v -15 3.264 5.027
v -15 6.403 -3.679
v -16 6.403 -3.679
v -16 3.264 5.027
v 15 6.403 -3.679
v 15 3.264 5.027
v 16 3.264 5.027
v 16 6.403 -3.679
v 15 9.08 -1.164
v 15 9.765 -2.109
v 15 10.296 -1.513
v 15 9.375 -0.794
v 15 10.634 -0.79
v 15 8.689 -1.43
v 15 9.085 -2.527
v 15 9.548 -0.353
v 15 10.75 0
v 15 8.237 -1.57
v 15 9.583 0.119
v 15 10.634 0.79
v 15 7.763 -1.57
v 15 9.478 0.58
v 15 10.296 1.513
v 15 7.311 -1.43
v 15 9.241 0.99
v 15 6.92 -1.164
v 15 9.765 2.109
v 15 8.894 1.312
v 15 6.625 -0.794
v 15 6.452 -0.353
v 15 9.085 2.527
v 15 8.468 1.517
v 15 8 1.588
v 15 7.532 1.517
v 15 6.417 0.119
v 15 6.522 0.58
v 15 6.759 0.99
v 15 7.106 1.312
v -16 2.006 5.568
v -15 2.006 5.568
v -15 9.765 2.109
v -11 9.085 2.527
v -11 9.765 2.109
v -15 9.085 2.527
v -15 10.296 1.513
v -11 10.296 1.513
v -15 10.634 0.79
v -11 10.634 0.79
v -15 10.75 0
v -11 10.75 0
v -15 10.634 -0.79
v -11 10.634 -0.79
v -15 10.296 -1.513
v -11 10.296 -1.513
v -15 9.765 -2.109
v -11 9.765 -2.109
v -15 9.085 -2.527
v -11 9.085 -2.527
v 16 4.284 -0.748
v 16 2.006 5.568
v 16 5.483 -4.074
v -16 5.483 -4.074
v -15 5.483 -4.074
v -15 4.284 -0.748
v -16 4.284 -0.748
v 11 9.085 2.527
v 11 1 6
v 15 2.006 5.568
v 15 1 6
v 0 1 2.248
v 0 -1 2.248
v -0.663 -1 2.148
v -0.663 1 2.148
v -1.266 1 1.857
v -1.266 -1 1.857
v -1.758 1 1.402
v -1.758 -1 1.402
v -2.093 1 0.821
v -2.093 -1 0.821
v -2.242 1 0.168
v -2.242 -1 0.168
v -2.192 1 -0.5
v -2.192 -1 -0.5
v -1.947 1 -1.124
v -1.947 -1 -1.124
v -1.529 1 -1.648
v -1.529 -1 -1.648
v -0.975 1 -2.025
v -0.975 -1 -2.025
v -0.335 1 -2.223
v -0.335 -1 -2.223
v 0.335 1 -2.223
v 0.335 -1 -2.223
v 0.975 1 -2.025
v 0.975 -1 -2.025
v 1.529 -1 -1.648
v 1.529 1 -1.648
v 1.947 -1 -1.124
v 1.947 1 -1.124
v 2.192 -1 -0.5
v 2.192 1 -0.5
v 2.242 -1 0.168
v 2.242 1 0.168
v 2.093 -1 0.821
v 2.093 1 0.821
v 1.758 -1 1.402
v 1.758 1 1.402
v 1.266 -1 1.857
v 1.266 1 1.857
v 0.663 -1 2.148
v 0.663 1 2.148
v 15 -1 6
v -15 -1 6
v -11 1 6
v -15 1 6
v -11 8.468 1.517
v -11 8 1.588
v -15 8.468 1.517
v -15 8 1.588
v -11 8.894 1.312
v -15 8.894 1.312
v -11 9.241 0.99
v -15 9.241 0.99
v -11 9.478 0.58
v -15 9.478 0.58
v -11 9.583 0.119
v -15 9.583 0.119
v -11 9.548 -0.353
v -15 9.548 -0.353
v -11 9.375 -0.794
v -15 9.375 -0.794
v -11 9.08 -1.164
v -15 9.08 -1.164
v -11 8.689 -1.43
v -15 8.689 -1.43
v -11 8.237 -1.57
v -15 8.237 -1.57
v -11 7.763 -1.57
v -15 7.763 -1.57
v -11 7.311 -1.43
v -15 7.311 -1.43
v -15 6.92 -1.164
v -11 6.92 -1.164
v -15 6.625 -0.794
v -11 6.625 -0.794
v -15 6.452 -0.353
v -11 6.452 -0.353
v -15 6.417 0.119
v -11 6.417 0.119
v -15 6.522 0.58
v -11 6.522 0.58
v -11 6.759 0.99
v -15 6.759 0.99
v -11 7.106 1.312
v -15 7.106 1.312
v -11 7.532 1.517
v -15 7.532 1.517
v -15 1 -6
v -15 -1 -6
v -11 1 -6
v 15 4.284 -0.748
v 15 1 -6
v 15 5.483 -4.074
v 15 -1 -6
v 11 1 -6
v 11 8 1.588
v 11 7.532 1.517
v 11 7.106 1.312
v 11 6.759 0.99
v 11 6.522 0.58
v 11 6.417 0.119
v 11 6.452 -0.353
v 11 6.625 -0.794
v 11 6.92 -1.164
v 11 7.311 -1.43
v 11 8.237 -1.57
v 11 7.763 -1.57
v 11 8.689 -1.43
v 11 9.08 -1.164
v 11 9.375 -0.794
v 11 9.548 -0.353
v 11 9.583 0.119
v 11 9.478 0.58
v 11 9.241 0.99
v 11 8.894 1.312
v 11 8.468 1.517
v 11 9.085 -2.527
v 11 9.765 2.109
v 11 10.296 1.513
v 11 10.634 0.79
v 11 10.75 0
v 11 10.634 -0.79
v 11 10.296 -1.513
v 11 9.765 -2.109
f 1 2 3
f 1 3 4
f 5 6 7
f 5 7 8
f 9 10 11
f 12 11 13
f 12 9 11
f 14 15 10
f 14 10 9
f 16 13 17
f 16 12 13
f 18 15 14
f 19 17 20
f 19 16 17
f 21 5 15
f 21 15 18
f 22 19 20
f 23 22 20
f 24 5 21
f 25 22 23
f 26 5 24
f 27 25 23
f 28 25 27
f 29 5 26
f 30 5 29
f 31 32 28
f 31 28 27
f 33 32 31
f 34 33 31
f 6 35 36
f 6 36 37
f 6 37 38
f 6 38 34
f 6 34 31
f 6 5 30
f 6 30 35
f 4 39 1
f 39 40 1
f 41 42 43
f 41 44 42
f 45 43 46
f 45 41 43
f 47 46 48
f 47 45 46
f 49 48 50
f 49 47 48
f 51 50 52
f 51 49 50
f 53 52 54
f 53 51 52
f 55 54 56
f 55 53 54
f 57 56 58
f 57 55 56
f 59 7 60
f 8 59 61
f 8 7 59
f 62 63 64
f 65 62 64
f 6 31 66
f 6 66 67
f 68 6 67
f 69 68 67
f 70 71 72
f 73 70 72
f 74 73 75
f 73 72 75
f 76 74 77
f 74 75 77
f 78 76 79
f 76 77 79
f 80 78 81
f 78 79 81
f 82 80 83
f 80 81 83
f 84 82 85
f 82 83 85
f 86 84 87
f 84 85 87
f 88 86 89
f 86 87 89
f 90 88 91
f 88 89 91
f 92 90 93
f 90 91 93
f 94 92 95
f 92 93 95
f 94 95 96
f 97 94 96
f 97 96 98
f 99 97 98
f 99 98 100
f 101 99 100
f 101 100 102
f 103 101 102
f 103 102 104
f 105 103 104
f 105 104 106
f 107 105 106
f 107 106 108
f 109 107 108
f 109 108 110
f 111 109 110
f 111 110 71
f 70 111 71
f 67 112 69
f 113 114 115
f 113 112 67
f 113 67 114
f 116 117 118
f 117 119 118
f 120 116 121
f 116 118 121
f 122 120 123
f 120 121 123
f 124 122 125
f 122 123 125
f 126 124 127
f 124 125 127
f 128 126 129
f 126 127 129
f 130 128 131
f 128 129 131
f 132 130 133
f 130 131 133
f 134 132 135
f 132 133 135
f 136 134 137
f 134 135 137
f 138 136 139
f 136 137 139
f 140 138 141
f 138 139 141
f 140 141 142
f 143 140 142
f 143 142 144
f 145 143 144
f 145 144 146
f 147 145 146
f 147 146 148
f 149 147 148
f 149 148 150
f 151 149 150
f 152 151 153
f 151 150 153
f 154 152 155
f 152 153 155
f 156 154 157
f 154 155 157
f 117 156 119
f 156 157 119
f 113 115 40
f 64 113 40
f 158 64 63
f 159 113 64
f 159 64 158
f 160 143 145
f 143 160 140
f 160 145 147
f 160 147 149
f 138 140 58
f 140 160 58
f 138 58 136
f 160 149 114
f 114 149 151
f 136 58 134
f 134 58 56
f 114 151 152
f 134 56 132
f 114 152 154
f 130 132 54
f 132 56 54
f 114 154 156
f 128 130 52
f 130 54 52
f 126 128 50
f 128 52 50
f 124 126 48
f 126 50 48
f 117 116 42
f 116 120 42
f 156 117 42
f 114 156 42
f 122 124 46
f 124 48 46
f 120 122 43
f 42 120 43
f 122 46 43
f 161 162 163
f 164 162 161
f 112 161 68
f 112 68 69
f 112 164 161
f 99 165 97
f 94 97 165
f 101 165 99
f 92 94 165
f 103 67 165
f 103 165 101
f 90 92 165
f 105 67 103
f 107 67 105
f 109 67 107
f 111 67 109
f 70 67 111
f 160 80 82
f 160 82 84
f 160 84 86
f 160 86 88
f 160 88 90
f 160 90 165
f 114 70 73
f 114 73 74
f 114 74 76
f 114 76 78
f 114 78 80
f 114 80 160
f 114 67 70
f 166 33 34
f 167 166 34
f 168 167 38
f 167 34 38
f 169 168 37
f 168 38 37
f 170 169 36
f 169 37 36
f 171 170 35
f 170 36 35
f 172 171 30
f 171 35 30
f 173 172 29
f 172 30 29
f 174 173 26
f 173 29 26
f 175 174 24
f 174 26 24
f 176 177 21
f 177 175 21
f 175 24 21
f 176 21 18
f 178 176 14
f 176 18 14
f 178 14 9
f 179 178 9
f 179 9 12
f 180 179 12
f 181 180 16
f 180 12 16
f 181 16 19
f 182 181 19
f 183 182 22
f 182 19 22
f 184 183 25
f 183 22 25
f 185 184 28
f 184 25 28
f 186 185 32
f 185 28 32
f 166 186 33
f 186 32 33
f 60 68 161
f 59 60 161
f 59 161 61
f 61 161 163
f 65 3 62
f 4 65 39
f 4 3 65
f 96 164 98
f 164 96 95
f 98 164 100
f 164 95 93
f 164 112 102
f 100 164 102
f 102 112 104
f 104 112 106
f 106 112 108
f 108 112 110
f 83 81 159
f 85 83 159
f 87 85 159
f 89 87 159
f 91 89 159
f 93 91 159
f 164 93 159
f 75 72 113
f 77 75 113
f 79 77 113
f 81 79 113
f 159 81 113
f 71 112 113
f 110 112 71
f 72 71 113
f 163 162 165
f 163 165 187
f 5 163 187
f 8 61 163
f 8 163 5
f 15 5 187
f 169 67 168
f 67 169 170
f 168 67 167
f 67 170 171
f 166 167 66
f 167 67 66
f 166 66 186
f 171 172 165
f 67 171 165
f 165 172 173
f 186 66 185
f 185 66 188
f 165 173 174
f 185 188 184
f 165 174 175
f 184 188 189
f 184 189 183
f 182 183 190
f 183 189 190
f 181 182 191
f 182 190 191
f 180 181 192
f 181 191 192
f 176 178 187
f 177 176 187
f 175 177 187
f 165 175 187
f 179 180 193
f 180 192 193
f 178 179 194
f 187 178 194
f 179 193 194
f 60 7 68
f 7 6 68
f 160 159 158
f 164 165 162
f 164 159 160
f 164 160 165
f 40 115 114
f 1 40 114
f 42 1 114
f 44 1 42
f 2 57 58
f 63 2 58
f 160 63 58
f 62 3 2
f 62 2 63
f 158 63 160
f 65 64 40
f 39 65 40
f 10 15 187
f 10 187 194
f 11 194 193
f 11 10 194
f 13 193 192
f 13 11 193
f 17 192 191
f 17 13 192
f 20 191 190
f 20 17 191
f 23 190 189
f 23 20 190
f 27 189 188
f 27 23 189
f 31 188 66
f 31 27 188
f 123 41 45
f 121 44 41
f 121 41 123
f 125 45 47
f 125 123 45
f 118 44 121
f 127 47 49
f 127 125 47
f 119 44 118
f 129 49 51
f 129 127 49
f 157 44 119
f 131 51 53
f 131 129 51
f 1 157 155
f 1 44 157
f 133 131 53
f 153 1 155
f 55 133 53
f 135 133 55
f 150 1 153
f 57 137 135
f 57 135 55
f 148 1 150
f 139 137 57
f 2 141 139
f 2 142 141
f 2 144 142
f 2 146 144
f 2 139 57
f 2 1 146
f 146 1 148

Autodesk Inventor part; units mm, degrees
ref_plane "YZ Plane" through (0, 0, 0) normal (1, 0, 0) x (0, 1, 0)
ref_plane "XZ Plane" through (0, 0, 0) normal (0, 1, 0) x (-1, 0, 0)
ref_plane "XY Plane" through (0, 0, 0) normal (0, 0, 1) x (1, 0, 0)
sketch "Sketch1" plane through (0, 0, 0) normal (0, 1, 0) x (-1, 0, 0)
  line L0 (-15, 6) -> (15, 6)
  line L1 (15, 6) -> (15, -6)
  line L2 (15, -6) -> (-15, -6)
  line L3 (-15, -6) -> (-15, 6)
  line L4 (-15, 6) -> (15, -6) construction
  line L5 (15, 6) -> (-15, -6) construction
  point P0 (0, 0)
  dimension "d0" = 12
  dimension "d1" = 30
extrude "Extrusion1" add sketch "Sketch1" along normal mid plane 2
sketch "Sketch2" plane through (-15, -1, 6) normal (-1, 0, 0) x (0, 0, 1)
  circle A0 centre (-6, 9) radius 1.5875
  circle A1 centre (-6, 9) radius 2.75
  line L0 (-8.5267, 10.0854) -> (-12, 2)
  line L1 (0, 0) -> (0, 2) projected
  line L2 (-12, 2) -> (0, 2)
  line L3 (0, 2) -> (-3.4733, 10.0854)
  point P0 (-6, 1)
  dimension "d4" = 3.175
  dimension "d5" = 5.5
  dimension "d6" = 7
extrude "Extrusion2" add sketch "Sketch2" against normal blind 4
mirror "Mirror1" about plane through (0, 0, 0) normal (1, 0, 0) of "Extrusion2"
sketch "Sketch5" plane through (15, -1, 6) normal (1, 0, 0) x (0, 0, -1)
  line L0 (8.5267, 10.0854) -> (12, 2) projected
  line L1 (12, 2) -> (8.5267, 10.0854) projected
  line L2 (0.9727, 4.2642) -> (0.4323, 3.0064)
  line L3 (0, 2) -> (3.4733, 10.0854) projected
  circle A0 centre (6, 9) radius 1.5875 projected
  circle A1 centre (6, 9) radius 2.75 construction
  line L4 (6.7482, 5.2835) -> (10.0744, 6.4827)
  line L5 (0.4323, 3.0064) -> (10.0744, 6.4827)
  arc A2 (8.5267, 10.0854) -> (3.4733, 10.0854) centre (6, 9) ccw projected
  line L6 (9.679, 7.4031) -> (10.0744, 6.4827)
  line L7 (0.9727, 4.2642) -> (9.679, 7.4031)
  line L8 (12, 0) -> (0, 0) projected
  point P0 (6, 1)
  dimension "d23" = 1
  dimension "d24" = 3.0064
extrude "Extrusion5" add sketch "Sketch5" along normal blind 1 contours L0 L4 L5 L2 L7
mirror "Mirror2" about plane through (0, 0, 0) normal (1, 0, 0) of "Extrusion5"
sketch "Sketch6" plane through (0, 1, 0) normal (0, 1, 0) x (1, 0, 0)
  point P0 (0, 0)
  point P1 (0, 0)
hole "Hole1" at (0, 1, 0) direction (0, -1, 0) diameter 4.496 depth 5.692 tip angle 118 clearance for "Flat Head Machine Screw (82)" size "#8" standard "Ansi Unified Screw Threads"
properties part number "EpoxyFiberMountBase"
